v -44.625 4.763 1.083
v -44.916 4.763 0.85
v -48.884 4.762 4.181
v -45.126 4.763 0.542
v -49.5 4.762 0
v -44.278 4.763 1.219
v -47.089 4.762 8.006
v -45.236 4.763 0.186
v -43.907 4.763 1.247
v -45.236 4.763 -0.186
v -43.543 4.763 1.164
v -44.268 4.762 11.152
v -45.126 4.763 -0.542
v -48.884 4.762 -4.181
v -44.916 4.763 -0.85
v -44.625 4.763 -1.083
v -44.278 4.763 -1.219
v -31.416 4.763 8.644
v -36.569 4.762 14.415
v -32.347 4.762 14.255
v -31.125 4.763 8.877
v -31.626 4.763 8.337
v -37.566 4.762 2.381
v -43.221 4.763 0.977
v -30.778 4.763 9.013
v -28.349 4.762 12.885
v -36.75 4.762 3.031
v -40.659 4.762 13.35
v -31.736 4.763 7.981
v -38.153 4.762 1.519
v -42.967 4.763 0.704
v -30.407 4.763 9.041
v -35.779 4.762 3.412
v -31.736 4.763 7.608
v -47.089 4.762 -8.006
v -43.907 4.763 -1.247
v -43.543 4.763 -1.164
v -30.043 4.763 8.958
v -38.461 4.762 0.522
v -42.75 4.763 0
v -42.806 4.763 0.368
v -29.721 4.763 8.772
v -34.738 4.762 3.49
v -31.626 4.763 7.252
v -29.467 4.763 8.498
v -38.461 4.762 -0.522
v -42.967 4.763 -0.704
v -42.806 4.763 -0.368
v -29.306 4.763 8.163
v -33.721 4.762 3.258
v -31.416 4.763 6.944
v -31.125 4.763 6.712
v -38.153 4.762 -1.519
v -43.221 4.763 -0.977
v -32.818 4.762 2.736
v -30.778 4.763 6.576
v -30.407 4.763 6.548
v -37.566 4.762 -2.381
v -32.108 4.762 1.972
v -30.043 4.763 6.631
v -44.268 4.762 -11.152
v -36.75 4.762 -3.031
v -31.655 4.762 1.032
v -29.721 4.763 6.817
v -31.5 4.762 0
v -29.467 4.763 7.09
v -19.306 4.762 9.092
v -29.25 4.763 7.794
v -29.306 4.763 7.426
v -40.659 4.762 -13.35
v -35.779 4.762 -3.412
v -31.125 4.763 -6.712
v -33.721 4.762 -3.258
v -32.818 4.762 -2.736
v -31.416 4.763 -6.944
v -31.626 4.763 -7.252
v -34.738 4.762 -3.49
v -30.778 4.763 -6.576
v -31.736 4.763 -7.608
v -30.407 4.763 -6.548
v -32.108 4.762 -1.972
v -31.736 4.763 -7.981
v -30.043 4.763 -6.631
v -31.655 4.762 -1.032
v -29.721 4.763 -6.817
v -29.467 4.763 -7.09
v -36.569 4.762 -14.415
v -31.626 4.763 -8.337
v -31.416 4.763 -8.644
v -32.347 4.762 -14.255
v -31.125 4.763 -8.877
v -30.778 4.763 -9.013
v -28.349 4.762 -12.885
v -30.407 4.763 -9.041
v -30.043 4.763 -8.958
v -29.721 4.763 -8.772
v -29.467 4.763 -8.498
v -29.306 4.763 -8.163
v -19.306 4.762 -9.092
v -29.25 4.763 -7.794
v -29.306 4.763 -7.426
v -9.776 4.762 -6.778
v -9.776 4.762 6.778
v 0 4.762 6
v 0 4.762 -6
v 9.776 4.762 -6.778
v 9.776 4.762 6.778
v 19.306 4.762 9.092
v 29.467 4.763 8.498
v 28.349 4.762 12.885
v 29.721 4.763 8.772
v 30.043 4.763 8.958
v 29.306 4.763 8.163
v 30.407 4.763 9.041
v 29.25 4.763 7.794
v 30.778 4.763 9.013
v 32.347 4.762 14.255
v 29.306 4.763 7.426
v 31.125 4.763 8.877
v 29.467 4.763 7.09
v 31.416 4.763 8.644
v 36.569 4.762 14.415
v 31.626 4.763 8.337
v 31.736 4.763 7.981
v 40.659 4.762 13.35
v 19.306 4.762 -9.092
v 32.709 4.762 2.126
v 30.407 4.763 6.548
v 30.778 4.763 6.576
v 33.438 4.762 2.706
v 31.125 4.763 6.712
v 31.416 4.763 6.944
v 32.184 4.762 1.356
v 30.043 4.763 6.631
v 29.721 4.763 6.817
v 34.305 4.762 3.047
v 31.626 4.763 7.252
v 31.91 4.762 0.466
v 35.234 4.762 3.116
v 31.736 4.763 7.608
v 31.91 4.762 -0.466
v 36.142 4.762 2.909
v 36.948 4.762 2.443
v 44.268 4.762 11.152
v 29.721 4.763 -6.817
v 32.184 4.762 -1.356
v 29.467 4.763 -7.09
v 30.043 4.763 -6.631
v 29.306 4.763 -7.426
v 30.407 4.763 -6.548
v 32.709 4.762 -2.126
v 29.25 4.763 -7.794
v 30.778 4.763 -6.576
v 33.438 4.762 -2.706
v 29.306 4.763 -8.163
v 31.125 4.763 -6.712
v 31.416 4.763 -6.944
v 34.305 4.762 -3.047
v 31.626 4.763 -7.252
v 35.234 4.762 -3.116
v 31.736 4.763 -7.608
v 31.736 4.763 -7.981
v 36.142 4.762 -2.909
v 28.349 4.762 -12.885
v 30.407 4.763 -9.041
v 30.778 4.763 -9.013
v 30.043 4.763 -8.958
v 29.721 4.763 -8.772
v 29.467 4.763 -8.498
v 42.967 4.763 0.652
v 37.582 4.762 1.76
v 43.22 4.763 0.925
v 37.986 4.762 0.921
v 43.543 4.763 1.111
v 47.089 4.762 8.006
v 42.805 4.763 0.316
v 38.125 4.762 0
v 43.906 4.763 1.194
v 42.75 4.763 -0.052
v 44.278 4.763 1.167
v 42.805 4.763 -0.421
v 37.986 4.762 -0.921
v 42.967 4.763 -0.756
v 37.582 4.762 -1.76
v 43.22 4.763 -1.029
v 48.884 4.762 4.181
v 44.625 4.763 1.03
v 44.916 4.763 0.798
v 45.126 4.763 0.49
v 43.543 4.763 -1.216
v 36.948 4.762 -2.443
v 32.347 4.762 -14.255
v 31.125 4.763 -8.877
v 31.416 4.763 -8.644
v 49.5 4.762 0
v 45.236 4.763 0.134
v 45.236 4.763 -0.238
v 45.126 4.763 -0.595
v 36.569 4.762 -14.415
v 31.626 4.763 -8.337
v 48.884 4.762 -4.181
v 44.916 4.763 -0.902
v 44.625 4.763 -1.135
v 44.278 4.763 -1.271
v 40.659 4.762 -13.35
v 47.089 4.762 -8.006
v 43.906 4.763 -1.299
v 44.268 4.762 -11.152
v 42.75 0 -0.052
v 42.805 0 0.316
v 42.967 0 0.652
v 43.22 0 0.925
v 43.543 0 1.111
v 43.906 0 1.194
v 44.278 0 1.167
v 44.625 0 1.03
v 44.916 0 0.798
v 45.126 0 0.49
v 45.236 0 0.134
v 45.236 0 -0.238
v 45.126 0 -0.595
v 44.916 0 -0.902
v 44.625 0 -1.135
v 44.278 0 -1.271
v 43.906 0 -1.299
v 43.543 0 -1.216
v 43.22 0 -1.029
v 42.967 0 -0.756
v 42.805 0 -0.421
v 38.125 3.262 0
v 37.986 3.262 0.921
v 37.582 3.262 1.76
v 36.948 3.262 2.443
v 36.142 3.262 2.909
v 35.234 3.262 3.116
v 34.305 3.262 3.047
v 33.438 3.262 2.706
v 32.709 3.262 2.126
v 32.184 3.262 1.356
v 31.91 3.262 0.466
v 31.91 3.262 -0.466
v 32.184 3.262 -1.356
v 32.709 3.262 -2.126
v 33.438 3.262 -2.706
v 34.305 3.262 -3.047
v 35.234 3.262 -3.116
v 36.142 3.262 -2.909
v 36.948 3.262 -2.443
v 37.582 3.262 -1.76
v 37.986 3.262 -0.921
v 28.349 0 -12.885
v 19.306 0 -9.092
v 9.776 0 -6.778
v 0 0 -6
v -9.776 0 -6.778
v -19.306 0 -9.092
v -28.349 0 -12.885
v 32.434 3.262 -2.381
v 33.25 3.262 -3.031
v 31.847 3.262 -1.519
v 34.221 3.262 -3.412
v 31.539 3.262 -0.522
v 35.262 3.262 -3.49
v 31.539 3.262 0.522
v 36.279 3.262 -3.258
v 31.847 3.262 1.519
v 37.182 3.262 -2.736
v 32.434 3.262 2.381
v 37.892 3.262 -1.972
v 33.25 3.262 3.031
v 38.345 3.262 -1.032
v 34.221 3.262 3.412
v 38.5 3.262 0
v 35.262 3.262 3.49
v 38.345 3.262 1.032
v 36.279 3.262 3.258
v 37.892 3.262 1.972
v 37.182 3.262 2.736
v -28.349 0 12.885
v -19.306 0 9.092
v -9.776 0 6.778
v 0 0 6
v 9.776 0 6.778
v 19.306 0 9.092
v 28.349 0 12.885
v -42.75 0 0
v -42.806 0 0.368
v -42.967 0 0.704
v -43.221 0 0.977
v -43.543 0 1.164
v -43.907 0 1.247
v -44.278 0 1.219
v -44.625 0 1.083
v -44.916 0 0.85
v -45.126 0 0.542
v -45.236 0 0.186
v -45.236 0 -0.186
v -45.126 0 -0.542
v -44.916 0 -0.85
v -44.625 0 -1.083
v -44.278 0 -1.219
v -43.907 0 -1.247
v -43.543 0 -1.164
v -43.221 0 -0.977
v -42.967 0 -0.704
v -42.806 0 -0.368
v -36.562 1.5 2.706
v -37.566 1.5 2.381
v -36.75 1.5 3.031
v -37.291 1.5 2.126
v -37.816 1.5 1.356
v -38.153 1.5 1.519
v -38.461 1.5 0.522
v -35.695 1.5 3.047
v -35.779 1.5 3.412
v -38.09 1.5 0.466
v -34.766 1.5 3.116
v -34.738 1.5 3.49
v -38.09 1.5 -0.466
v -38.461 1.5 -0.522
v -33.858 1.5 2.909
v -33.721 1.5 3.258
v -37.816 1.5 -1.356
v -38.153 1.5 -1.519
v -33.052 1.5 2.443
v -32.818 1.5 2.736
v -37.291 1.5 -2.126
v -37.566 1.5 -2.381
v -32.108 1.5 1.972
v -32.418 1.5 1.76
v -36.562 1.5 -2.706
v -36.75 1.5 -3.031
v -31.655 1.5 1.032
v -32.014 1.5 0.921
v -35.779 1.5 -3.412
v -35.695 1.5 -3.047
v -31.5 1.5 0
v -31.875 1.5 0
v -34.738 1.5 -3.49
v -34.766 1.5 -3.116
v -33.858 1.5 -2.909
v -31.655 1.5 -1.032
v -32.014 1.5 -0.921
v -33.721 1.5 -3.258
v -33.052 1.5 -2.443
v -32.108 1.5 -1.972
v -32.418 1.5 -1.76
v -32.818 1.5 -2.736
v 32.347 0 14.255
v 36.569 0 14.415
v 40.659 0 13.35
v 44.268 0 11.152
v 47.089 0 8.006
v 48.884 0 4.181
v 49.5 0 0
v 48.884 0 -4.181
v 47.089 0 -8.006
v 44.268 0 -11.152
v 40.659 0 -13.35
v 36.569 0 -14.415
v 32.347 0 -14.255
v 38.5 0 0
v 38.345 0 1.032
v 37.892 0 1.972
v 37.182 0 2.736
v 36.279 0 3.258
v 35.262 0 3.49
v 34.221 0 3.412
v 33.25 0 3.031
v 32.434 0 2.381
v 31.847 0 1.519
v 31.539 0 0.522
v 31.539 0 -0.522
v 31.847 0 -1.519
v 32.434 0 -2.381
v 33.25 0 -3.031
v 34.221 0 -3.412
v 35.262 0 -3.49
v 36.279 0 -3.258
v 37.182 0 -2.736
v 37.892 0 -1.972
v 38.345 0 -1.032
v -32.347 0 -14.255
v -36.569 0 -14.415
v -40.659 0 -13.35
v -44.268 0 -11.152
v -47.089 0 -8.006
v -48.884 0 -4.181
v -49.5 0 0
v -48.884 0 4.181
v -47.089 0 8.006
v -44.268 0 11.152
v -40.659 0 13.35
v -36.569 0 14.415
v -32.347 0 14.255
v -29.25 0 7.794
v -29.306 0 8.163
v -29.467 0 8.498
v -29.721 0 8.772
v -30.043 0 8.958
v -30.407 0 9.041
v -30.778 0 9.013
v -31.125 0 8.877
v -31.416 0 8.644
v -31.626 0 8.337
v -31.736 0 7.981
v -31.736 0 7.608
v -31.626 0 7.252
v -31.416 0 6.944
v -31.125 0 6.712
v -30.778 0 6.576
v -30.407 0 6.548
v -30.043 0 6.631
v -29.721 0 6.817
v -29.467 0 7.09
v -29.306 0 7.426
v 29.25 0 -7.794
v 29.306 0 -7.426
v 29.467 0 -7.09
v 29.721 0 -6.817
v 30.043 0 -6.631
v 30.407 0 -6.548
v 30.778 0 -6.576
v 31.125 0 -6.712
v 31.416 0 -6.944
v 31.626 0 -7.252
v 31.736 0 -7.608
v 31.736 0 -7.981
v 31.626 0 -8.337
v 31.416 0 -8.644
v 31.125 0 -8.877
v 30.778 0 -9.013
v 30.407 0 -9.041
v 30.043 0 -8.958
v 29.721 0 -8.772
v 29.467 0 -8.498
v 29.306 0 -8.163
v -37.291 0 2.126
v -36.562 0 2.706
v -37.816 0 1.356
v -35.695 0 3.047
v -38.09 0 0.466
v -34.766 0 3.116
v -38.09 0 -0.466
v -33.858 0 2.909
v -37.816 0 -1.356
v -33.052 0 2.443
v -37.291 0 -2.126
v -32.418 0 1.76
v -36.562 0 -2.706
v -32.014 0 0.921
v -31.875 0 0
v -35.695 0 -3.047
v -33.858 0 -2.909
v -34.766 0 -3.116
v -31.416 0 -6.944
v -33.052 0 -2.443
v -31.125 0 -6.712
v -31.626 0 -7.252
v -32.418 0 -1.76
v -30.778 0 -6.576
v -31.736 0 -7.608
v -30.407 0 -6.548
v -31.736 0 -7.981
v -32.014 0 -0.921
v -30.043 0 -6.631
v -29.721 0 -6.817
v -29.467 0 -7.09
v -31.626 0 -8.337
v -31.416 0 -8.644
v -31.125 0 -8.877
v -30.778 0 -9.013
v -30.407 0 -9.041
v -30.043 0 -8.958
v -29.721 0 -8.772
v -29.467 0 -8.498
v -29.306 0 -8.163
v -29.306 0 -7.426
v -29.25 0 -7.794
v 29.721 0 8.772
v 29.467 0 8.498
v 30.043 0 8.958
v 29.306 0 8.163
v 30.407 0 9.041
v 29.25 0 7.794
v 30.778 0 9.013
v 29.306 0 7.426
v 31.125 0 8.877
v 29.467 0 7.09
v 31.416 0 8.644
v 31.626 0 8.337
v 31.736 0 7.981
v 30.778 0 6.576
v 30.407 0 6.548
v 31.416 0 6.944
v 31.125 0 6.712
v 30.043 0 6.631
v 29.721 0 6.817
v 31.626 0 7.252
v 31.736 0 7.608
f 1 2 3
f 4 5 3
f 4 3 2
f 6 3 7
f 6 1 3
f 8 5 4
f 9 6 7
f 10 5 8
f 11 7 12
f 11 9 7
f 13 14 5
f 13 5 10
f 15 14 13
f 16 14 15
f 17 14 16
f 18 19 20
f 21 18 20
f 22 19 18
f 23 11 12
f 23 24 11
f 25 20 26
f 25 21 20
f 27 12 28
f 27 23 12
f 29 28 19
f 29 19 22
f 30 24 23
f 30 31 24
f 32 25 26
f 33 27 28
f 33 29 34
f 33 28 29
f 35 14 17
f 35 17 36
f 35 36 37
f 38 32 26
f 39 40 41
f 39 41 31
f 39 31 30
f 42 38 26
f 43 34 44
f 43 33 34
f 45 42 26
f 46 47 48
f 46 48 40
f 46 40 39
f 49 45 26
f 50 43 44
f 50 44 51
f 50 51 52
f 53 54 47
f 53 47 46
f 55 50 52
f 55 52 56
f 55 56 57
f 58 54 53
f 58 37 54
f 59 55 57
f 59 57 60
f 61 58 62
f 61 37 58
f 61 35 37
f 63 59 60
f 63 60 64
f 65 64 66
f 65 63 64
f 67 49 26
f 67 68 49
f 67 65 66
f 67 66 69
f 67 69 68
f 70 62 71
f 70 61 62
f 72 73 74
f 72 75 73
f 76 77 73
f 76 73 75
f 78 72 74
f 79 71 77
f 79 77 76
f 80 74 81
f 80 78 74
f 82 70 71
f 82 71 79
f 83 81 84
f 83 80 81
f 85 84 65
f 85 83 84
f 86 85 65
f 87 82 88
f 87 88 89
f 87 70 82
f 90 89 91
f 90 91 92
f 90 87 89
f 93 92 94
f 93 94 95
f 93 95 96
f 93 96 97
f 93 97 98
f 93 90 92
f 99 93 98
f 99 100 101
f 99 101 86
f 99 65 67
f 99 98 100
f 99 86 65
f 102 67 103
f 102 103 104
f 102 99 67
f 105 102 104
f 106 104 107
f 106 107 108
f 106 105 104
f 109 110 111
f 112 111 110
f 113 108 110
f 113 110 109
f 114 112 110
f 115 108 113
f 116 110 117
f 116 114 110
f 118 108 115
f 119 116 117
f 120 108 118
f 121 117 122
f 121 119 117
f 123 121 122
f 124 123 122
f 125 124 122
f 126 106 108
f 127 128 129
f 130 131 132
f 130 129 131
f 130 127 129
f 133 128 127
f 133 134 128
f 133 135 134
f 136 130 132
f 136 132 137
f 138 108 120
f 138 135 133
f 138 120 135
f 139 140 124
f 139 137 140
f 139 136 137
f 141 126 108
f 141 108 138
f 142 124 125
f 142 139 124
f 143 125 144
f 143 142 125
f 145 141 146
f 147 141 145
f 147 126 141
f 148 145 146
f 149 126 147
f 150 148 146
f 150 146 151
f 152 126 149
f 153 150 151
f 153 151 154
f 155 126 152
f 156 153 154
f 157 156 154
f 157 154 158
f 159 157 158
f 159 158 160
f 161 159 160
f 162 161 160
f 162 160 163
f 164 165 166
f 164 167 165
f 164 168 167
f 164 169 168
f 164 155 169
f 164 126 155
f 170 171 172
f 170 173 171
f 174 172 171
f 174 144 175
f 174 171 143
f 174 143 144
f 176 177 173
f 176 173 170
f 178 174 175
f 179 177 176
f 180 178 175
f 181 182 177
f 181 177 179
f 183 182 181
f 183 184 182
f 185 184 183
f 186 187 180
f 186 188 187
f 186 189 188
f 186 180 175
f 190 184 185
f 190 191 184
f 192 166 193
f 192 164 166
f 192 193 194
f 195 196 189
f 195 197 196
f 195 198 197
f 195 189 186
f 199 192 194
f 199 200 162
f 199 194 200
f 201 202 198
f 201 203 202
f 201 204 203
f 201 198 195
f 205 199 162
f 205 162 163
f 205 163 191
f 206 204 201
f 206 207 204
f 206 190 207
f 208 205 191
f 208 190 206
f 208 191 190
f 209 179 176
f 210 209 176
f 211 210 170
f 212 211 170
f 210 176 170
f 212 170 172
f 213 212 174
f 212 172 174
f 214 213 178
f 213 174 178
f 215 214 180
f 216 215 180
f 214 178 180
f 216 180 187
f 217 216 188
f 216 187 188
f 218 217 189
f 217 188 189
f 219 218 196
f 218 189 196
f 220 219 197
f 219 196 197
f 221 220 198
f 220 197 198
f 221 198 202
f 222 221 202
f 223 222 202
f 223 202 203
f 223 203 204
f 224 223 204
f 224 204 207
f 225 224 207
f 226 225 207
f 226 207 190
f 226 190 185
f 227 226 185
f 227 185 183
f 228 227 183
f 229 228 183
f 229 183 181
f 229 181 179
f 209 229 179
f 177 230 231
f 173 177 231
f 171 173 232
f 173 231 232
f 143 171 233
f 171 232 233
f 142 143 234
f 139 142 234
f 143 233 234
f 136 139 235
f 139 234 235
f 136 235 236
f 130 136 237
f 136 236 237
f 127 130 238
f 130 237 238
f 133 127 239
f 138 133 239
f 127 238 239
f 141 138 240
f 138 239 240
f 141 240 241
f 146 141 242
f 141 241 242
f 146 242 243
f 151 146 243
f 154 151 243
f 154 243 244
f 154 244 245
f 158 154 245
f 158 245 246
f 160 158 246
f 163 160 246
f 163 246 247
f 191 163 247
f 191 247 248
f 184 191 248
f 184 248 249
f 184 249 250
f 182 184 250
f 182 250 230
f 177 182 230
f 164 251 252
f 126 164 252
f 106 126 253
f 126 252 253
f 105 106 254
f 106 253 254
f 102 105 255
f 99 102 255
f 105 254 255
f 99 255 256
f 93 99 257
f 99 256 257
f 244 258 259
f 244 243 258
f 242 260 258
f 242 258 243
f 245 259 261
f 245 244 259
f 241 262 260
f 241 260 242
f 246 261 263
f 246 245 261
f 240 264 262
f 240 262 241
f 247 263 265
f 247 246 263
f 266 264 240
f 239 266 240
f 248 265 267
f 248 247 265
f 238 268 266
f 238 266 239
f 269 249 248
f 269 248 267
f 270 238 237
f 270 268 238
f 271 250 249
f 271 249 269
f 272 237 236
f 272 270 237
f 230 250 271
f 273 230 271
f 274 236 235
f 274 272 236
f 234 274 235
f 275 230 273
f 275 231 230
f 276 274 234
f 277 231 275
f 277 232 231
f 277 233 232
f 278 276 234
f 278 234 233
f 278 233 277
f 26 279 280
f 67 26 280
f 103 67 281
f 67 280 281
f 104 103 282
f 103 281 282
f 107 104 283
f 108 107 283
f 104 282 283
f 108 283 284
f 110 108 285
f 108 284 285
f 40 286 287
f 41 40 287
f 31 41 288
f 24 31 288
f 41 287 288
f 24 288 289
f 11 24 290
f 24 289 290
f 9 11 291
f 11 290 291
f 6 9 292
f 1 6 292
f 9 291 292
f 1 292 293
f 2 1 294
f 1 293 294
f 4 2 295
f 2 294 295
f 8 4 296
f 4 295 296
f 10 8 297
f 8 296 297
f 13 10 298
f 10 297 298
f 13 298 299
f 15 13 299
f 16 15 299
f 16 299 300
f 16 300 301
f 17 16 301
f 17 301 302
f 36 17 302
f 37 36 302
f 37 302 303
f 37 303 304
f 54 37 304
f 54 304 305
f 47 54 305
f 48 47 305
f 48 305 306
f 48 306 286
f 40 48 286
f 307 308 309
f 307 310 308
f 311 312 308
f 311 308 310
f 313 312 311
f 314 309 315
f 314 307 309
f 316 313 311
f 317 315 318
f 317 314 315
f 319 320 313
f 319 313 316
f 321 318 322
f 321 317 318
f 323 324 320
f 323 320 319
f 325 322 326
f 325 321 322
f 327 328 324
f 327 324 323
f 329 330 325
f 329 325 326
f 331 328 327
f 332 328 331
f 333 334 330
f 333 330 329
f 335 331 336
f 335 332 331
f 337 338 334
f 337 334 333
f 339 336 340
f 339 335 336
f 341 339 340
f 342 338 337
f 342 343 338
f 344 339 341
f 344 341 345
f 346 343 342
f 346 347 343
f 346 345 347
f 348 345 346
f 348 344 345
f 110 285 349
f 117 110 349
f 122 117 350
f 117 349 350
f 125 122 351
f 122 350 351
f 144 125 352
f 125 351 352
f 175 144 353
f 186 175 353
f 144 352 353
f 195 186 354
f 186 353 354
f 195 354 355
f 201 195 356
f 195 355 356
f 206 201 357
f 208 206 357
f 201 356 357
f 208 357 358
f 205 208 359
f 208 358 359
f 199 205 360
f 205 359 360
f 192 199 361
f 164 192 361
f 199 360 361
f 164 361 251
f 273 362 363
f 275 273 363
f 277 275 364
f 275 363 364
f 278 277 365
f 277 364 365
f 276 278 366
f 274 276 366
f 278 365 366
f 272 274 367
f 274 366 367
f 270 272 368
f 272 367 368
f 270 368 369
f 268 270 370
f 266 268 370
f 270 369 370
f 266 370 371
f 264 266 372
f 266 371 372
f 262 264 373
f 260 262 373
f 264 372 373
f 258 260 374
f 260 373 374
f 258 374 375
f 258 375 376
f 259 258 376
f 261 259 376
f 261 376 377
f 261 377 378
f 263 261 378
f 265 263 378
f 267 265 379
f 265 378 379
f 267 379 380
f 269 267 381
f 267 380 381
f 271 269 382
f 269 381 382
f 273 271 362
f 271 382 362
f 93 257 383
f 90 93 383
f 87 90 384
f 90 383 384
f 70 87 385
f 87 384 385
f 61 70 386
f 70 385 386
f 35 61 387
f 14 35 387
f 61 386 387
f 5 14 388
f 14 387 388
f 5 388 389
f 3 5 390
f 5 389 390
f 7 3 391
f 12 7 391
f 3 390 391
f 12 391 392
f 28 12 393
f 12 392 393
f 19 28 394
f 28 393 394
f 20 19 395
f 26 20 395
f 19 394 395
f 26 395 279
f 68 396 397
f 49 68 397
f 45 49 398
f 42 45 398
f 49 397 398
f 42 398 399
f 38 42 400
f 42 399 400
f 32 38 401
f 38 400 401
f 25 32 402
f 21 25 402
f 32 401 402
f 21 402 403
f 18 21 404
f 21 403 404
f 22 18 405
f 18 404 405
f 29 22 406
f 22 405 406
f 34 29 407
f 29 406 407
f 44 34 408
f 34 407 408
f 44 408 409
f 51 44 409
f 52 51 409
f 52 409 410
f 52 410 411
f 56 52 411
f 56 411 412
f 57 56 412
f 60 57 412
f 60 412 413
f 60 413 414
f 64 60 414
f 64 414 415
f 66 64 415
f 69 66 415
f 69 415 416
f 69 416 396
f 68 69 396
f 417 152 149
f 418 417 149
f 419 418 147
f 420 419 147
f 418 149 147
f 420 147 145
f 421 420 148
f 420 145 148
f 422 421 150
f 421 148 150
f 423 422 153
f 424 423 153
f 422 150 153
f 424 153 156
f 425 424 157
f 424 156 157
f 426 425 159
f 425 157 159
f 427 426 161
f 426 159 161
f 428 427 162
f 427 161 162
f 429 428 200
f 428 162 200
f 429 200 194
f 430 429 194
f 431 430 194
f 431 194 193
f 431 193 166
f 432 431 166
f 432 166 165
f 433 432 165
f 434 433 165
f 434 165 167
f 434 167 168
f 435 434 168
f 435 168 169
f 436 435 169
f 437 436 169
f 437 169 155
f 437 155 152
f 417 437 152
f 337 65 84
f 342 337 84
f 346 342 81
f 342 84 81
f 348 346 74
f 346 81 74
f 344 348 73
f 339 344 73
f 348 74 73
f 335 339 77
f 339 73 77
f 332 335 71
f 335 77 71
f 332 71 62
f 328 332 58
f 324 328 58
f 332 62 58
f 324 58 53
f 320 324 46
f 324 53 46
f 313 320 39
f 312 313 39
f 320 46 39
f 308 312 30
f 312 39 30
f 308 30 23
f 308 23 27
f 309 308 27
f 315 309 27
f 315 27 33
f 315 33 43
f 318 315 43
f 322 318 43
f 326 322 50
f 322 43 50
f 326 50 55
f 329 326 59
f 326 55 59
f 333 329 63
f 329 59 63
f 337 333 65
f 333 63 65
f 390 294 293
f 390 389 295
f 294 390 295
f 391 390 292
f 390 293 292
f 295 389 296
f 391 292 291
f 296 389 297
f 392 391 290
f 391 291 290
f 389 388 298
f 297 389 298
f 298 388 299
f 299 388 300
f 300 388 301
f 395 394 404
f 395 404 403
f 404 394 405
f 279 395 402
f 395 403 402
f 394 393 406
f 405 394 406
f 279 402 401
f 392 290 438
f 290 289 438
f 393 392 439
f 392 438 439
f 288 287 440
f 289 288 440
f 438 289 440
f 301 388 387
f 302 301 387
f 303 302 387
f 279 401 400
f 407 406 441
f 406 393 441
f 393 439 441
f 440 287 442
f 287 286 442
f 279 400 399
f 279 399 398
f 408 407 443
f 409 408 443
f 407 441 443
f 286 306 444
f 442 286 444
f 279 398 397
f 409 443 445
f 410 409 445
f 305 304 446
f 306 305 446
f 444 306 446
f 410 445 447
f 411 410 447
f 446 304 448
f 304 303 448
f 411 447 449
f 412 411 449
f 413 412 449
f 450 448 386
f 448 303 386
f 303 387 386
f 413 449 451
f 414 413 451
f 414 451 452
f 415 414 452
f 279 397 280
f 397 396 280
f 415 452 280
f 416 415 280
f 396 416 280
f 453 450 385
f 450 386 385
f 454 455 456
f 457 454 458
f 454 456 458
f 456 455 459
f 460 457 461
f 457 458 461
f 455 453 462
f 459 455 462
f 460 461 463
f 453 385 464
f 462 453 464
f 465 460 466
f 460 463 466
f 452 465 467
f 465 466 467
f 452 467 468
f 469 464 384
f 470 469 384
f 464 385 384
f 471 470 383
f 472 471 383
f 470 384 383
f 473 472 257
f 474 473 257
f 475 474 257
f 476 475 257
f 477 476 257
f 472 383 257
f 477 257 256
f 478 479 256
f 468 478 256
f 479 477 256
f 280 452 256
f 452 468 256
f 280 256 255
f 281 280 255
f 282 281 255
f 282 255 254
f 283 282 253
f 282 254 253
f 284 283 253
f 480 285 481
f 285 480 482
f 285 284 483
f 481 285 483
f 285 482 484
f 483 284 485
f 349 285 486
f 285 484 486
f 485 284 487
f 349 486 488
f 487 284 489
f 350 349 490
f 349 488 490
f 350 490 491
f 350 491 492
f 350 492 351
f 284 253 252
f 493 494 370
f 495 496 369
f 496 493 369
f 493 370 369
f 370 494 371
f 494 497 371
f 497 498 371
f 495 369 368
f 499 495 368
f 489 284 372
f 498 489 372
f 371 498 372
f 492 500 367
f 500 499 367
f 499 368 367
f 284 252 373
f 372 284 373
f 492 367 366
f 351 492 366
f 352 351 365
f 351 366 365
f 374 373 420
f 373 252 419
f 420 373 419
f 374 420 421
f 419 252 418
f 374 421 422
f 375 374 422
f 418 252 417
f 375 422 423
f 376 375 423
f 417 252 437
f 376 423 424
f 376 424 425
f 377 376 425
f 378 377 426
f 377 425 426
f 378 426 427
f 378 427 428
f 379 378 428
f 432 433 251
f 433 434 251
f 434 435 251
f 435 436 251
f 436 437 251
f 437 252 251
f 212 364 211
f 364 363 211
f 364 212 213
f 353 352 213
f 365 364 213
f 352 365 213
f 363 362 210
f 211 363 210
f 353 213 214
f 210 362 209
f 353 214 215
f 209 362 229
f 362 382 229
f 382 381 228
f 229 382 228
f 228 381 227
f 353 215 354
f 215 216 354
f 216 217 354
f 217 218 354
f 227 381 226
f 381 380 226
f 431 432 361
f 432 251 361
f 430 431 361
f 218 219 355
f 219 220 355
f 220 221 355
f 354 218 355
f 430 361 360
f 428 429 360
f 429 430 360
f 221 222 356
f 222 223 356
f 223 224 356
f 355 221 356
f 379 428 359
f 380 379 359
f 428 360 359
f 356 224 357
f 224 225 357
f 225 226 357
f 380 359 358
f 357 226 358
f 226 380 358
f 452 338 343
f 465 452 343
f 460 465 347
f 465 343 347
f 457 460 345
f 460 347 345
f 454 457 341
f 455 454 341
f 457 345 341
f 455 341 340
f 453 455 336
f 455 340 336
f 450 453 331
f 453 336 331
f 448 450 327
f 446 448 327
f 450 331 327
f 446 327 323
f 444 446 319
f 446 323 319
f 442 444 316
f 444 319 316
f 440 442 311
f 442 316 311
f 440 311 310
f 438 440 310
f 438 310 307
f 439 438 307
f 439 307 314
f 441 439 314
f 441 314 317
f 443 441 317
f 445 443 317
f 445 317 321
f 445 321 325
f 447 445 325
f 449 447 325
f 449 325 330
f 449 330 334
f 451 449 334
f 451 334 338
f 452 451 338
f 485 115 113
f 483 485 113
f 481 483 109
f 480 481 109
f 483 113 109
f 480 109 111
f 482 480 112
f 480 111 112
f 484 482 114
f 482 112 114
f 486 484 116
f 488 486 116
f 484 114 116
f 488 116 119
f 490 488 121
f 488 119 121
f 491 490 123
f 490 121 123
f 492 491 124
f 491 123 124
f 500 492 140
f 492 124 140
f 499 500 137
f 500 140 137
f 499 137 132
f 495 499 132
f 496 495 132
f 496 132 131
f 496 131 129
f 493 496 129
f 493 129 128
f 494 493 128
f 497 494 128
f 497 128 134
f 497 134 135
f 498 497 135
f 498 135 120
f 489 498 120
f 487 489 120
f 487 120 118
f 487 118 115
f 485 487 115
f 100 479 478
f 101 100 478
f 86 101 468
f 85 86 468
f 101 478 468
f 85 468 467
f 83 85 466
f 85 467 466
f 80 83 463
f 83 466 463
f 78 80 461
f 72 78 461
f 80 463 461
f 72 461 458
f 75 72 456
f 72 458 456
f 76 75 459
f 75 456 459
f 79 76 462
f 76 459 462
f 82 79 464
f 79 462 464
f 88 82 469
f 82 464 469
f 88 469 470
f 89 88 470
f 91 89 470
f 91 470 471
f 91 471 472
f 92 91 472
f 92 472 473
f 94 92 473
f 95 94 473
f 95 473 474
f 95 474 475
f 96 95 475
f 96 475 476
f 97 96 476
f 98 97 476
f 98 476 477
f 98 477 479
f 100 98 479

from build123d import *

# Parameters (mm, degrees)
BOSS_EXTRUDE1_DEPTH   = 4.7625
SKETCH2_R             = 3.5
CUT_EXTRUDE1_DEPTH    = 3.2625
SKETCH3_R             = 3.125
CUT_EXTRUDE2_DEPTH    = 2.5
SKETCH6_R             = 3.125
CUT_EXTRUDE5_DEPTH    = 5.7625
SKETCH7_R             = 3.5
CUT_EXTRUDE6_DEPTH    = 3.2625
M3X0_5_TAPPED_HOLE1_D = 2.5
M3X0_5_TAPPED_HOLE2_D = 2.5


with BuildPart() as part:
    # Sketch1 → Boss-Extrude1 (new body)
    with BuildSketch(Plane(origin=(0, 0, 0), x_dir=(1, 0, 0), z_dir=(0, 1, 0))):
        with BuildLine():
            ThreePointArc((-28.349392947, 12.884852573), (-49.5, 0), (-28.349392947, -12.884852573))
            ThreePointArc((-28.349392947, -12.884852573), (0, -6), (28.349392947, -12.884852573))
            ThreePointArc((28.349392947, -12.884852573), (49.5, 0), (28.349392947, 12.884852573))
            ThreePointArc((28.349392947, 12.884852573), (0, 6), (-28.349392947, 12.884852573))
        make_face()
    extrude(amount=BOSS_EXTRUDE1_DEPTH)

    # Sketch2 → Cut-Extrude1 (cut)
    with BuildSketch(Plane(origin=(0, 4.7625, 0), x_dir=(1, 0, 0), z_dir=(0, 1, 0))):
        with Locations((-35, 0)):
            Circle(SKETCH2_R)
    extrude(amount=-CUT_EXTRUDE1_DEPTH, mode=Mode.SUBTRACT)

    # Sketch3 → Cut-Extrude2 (cut, through all)
    with BuildSketch(Plane(origin=(0, 1.5, 0), x_dir=(1, 0, 0), z_dir=(0, 1, 0))):
        with Locations((-35, 0)):
            Circle(SKETCH3_R)
    extrude(amount=-CUT_EXTRUDE2_DEPTH, mode=Mode.SUBTRACT)

    # Sketch6 → Cut-Extrude5 (cut, through all)
    with BuildSketch(Plane.XZ):
        with Locations((35, 0)):
            Circle(SKETCH6_R)
    extrude(amount=-CUT_EXTRUDE5_DEPTH, mode=Mode.SUBTRACT)

    # Sketch7 → Cut-Extrude6 (cut)
    with BuildSketch(Plane.XZ):
        with Locations((35, 0)):
            Circle(SKETCH7_R)
    extrude(amount=-CUT_EXTRUDE6_DEPTH, mode=Mode.SUBTRACT)

    # M3x0.5 Tapped Hole1 (through all)
    with Locations(Plane(origin=(0, 4.7625, 0), x_dir=(-1, 0, 0), z_dir=(0, 1, 0))):
        with Locations((30.5, 7.794228634), (44, 0), (30.5, -7.794228634)):
            Hole(M3X0_5_TAPPED_HOLE1_D / 2)

    # M3x0.5 Tapped Hole2 (through all)
    with Locations(Plane.XZ):
        with Locations((43.999848922, -0.052147689), (30.5, 7.794228634), (30.5, -7.794228634)):
            Hole(M3X0_5_TAPPED_HOLE2_D / 2)


solid = part.part
